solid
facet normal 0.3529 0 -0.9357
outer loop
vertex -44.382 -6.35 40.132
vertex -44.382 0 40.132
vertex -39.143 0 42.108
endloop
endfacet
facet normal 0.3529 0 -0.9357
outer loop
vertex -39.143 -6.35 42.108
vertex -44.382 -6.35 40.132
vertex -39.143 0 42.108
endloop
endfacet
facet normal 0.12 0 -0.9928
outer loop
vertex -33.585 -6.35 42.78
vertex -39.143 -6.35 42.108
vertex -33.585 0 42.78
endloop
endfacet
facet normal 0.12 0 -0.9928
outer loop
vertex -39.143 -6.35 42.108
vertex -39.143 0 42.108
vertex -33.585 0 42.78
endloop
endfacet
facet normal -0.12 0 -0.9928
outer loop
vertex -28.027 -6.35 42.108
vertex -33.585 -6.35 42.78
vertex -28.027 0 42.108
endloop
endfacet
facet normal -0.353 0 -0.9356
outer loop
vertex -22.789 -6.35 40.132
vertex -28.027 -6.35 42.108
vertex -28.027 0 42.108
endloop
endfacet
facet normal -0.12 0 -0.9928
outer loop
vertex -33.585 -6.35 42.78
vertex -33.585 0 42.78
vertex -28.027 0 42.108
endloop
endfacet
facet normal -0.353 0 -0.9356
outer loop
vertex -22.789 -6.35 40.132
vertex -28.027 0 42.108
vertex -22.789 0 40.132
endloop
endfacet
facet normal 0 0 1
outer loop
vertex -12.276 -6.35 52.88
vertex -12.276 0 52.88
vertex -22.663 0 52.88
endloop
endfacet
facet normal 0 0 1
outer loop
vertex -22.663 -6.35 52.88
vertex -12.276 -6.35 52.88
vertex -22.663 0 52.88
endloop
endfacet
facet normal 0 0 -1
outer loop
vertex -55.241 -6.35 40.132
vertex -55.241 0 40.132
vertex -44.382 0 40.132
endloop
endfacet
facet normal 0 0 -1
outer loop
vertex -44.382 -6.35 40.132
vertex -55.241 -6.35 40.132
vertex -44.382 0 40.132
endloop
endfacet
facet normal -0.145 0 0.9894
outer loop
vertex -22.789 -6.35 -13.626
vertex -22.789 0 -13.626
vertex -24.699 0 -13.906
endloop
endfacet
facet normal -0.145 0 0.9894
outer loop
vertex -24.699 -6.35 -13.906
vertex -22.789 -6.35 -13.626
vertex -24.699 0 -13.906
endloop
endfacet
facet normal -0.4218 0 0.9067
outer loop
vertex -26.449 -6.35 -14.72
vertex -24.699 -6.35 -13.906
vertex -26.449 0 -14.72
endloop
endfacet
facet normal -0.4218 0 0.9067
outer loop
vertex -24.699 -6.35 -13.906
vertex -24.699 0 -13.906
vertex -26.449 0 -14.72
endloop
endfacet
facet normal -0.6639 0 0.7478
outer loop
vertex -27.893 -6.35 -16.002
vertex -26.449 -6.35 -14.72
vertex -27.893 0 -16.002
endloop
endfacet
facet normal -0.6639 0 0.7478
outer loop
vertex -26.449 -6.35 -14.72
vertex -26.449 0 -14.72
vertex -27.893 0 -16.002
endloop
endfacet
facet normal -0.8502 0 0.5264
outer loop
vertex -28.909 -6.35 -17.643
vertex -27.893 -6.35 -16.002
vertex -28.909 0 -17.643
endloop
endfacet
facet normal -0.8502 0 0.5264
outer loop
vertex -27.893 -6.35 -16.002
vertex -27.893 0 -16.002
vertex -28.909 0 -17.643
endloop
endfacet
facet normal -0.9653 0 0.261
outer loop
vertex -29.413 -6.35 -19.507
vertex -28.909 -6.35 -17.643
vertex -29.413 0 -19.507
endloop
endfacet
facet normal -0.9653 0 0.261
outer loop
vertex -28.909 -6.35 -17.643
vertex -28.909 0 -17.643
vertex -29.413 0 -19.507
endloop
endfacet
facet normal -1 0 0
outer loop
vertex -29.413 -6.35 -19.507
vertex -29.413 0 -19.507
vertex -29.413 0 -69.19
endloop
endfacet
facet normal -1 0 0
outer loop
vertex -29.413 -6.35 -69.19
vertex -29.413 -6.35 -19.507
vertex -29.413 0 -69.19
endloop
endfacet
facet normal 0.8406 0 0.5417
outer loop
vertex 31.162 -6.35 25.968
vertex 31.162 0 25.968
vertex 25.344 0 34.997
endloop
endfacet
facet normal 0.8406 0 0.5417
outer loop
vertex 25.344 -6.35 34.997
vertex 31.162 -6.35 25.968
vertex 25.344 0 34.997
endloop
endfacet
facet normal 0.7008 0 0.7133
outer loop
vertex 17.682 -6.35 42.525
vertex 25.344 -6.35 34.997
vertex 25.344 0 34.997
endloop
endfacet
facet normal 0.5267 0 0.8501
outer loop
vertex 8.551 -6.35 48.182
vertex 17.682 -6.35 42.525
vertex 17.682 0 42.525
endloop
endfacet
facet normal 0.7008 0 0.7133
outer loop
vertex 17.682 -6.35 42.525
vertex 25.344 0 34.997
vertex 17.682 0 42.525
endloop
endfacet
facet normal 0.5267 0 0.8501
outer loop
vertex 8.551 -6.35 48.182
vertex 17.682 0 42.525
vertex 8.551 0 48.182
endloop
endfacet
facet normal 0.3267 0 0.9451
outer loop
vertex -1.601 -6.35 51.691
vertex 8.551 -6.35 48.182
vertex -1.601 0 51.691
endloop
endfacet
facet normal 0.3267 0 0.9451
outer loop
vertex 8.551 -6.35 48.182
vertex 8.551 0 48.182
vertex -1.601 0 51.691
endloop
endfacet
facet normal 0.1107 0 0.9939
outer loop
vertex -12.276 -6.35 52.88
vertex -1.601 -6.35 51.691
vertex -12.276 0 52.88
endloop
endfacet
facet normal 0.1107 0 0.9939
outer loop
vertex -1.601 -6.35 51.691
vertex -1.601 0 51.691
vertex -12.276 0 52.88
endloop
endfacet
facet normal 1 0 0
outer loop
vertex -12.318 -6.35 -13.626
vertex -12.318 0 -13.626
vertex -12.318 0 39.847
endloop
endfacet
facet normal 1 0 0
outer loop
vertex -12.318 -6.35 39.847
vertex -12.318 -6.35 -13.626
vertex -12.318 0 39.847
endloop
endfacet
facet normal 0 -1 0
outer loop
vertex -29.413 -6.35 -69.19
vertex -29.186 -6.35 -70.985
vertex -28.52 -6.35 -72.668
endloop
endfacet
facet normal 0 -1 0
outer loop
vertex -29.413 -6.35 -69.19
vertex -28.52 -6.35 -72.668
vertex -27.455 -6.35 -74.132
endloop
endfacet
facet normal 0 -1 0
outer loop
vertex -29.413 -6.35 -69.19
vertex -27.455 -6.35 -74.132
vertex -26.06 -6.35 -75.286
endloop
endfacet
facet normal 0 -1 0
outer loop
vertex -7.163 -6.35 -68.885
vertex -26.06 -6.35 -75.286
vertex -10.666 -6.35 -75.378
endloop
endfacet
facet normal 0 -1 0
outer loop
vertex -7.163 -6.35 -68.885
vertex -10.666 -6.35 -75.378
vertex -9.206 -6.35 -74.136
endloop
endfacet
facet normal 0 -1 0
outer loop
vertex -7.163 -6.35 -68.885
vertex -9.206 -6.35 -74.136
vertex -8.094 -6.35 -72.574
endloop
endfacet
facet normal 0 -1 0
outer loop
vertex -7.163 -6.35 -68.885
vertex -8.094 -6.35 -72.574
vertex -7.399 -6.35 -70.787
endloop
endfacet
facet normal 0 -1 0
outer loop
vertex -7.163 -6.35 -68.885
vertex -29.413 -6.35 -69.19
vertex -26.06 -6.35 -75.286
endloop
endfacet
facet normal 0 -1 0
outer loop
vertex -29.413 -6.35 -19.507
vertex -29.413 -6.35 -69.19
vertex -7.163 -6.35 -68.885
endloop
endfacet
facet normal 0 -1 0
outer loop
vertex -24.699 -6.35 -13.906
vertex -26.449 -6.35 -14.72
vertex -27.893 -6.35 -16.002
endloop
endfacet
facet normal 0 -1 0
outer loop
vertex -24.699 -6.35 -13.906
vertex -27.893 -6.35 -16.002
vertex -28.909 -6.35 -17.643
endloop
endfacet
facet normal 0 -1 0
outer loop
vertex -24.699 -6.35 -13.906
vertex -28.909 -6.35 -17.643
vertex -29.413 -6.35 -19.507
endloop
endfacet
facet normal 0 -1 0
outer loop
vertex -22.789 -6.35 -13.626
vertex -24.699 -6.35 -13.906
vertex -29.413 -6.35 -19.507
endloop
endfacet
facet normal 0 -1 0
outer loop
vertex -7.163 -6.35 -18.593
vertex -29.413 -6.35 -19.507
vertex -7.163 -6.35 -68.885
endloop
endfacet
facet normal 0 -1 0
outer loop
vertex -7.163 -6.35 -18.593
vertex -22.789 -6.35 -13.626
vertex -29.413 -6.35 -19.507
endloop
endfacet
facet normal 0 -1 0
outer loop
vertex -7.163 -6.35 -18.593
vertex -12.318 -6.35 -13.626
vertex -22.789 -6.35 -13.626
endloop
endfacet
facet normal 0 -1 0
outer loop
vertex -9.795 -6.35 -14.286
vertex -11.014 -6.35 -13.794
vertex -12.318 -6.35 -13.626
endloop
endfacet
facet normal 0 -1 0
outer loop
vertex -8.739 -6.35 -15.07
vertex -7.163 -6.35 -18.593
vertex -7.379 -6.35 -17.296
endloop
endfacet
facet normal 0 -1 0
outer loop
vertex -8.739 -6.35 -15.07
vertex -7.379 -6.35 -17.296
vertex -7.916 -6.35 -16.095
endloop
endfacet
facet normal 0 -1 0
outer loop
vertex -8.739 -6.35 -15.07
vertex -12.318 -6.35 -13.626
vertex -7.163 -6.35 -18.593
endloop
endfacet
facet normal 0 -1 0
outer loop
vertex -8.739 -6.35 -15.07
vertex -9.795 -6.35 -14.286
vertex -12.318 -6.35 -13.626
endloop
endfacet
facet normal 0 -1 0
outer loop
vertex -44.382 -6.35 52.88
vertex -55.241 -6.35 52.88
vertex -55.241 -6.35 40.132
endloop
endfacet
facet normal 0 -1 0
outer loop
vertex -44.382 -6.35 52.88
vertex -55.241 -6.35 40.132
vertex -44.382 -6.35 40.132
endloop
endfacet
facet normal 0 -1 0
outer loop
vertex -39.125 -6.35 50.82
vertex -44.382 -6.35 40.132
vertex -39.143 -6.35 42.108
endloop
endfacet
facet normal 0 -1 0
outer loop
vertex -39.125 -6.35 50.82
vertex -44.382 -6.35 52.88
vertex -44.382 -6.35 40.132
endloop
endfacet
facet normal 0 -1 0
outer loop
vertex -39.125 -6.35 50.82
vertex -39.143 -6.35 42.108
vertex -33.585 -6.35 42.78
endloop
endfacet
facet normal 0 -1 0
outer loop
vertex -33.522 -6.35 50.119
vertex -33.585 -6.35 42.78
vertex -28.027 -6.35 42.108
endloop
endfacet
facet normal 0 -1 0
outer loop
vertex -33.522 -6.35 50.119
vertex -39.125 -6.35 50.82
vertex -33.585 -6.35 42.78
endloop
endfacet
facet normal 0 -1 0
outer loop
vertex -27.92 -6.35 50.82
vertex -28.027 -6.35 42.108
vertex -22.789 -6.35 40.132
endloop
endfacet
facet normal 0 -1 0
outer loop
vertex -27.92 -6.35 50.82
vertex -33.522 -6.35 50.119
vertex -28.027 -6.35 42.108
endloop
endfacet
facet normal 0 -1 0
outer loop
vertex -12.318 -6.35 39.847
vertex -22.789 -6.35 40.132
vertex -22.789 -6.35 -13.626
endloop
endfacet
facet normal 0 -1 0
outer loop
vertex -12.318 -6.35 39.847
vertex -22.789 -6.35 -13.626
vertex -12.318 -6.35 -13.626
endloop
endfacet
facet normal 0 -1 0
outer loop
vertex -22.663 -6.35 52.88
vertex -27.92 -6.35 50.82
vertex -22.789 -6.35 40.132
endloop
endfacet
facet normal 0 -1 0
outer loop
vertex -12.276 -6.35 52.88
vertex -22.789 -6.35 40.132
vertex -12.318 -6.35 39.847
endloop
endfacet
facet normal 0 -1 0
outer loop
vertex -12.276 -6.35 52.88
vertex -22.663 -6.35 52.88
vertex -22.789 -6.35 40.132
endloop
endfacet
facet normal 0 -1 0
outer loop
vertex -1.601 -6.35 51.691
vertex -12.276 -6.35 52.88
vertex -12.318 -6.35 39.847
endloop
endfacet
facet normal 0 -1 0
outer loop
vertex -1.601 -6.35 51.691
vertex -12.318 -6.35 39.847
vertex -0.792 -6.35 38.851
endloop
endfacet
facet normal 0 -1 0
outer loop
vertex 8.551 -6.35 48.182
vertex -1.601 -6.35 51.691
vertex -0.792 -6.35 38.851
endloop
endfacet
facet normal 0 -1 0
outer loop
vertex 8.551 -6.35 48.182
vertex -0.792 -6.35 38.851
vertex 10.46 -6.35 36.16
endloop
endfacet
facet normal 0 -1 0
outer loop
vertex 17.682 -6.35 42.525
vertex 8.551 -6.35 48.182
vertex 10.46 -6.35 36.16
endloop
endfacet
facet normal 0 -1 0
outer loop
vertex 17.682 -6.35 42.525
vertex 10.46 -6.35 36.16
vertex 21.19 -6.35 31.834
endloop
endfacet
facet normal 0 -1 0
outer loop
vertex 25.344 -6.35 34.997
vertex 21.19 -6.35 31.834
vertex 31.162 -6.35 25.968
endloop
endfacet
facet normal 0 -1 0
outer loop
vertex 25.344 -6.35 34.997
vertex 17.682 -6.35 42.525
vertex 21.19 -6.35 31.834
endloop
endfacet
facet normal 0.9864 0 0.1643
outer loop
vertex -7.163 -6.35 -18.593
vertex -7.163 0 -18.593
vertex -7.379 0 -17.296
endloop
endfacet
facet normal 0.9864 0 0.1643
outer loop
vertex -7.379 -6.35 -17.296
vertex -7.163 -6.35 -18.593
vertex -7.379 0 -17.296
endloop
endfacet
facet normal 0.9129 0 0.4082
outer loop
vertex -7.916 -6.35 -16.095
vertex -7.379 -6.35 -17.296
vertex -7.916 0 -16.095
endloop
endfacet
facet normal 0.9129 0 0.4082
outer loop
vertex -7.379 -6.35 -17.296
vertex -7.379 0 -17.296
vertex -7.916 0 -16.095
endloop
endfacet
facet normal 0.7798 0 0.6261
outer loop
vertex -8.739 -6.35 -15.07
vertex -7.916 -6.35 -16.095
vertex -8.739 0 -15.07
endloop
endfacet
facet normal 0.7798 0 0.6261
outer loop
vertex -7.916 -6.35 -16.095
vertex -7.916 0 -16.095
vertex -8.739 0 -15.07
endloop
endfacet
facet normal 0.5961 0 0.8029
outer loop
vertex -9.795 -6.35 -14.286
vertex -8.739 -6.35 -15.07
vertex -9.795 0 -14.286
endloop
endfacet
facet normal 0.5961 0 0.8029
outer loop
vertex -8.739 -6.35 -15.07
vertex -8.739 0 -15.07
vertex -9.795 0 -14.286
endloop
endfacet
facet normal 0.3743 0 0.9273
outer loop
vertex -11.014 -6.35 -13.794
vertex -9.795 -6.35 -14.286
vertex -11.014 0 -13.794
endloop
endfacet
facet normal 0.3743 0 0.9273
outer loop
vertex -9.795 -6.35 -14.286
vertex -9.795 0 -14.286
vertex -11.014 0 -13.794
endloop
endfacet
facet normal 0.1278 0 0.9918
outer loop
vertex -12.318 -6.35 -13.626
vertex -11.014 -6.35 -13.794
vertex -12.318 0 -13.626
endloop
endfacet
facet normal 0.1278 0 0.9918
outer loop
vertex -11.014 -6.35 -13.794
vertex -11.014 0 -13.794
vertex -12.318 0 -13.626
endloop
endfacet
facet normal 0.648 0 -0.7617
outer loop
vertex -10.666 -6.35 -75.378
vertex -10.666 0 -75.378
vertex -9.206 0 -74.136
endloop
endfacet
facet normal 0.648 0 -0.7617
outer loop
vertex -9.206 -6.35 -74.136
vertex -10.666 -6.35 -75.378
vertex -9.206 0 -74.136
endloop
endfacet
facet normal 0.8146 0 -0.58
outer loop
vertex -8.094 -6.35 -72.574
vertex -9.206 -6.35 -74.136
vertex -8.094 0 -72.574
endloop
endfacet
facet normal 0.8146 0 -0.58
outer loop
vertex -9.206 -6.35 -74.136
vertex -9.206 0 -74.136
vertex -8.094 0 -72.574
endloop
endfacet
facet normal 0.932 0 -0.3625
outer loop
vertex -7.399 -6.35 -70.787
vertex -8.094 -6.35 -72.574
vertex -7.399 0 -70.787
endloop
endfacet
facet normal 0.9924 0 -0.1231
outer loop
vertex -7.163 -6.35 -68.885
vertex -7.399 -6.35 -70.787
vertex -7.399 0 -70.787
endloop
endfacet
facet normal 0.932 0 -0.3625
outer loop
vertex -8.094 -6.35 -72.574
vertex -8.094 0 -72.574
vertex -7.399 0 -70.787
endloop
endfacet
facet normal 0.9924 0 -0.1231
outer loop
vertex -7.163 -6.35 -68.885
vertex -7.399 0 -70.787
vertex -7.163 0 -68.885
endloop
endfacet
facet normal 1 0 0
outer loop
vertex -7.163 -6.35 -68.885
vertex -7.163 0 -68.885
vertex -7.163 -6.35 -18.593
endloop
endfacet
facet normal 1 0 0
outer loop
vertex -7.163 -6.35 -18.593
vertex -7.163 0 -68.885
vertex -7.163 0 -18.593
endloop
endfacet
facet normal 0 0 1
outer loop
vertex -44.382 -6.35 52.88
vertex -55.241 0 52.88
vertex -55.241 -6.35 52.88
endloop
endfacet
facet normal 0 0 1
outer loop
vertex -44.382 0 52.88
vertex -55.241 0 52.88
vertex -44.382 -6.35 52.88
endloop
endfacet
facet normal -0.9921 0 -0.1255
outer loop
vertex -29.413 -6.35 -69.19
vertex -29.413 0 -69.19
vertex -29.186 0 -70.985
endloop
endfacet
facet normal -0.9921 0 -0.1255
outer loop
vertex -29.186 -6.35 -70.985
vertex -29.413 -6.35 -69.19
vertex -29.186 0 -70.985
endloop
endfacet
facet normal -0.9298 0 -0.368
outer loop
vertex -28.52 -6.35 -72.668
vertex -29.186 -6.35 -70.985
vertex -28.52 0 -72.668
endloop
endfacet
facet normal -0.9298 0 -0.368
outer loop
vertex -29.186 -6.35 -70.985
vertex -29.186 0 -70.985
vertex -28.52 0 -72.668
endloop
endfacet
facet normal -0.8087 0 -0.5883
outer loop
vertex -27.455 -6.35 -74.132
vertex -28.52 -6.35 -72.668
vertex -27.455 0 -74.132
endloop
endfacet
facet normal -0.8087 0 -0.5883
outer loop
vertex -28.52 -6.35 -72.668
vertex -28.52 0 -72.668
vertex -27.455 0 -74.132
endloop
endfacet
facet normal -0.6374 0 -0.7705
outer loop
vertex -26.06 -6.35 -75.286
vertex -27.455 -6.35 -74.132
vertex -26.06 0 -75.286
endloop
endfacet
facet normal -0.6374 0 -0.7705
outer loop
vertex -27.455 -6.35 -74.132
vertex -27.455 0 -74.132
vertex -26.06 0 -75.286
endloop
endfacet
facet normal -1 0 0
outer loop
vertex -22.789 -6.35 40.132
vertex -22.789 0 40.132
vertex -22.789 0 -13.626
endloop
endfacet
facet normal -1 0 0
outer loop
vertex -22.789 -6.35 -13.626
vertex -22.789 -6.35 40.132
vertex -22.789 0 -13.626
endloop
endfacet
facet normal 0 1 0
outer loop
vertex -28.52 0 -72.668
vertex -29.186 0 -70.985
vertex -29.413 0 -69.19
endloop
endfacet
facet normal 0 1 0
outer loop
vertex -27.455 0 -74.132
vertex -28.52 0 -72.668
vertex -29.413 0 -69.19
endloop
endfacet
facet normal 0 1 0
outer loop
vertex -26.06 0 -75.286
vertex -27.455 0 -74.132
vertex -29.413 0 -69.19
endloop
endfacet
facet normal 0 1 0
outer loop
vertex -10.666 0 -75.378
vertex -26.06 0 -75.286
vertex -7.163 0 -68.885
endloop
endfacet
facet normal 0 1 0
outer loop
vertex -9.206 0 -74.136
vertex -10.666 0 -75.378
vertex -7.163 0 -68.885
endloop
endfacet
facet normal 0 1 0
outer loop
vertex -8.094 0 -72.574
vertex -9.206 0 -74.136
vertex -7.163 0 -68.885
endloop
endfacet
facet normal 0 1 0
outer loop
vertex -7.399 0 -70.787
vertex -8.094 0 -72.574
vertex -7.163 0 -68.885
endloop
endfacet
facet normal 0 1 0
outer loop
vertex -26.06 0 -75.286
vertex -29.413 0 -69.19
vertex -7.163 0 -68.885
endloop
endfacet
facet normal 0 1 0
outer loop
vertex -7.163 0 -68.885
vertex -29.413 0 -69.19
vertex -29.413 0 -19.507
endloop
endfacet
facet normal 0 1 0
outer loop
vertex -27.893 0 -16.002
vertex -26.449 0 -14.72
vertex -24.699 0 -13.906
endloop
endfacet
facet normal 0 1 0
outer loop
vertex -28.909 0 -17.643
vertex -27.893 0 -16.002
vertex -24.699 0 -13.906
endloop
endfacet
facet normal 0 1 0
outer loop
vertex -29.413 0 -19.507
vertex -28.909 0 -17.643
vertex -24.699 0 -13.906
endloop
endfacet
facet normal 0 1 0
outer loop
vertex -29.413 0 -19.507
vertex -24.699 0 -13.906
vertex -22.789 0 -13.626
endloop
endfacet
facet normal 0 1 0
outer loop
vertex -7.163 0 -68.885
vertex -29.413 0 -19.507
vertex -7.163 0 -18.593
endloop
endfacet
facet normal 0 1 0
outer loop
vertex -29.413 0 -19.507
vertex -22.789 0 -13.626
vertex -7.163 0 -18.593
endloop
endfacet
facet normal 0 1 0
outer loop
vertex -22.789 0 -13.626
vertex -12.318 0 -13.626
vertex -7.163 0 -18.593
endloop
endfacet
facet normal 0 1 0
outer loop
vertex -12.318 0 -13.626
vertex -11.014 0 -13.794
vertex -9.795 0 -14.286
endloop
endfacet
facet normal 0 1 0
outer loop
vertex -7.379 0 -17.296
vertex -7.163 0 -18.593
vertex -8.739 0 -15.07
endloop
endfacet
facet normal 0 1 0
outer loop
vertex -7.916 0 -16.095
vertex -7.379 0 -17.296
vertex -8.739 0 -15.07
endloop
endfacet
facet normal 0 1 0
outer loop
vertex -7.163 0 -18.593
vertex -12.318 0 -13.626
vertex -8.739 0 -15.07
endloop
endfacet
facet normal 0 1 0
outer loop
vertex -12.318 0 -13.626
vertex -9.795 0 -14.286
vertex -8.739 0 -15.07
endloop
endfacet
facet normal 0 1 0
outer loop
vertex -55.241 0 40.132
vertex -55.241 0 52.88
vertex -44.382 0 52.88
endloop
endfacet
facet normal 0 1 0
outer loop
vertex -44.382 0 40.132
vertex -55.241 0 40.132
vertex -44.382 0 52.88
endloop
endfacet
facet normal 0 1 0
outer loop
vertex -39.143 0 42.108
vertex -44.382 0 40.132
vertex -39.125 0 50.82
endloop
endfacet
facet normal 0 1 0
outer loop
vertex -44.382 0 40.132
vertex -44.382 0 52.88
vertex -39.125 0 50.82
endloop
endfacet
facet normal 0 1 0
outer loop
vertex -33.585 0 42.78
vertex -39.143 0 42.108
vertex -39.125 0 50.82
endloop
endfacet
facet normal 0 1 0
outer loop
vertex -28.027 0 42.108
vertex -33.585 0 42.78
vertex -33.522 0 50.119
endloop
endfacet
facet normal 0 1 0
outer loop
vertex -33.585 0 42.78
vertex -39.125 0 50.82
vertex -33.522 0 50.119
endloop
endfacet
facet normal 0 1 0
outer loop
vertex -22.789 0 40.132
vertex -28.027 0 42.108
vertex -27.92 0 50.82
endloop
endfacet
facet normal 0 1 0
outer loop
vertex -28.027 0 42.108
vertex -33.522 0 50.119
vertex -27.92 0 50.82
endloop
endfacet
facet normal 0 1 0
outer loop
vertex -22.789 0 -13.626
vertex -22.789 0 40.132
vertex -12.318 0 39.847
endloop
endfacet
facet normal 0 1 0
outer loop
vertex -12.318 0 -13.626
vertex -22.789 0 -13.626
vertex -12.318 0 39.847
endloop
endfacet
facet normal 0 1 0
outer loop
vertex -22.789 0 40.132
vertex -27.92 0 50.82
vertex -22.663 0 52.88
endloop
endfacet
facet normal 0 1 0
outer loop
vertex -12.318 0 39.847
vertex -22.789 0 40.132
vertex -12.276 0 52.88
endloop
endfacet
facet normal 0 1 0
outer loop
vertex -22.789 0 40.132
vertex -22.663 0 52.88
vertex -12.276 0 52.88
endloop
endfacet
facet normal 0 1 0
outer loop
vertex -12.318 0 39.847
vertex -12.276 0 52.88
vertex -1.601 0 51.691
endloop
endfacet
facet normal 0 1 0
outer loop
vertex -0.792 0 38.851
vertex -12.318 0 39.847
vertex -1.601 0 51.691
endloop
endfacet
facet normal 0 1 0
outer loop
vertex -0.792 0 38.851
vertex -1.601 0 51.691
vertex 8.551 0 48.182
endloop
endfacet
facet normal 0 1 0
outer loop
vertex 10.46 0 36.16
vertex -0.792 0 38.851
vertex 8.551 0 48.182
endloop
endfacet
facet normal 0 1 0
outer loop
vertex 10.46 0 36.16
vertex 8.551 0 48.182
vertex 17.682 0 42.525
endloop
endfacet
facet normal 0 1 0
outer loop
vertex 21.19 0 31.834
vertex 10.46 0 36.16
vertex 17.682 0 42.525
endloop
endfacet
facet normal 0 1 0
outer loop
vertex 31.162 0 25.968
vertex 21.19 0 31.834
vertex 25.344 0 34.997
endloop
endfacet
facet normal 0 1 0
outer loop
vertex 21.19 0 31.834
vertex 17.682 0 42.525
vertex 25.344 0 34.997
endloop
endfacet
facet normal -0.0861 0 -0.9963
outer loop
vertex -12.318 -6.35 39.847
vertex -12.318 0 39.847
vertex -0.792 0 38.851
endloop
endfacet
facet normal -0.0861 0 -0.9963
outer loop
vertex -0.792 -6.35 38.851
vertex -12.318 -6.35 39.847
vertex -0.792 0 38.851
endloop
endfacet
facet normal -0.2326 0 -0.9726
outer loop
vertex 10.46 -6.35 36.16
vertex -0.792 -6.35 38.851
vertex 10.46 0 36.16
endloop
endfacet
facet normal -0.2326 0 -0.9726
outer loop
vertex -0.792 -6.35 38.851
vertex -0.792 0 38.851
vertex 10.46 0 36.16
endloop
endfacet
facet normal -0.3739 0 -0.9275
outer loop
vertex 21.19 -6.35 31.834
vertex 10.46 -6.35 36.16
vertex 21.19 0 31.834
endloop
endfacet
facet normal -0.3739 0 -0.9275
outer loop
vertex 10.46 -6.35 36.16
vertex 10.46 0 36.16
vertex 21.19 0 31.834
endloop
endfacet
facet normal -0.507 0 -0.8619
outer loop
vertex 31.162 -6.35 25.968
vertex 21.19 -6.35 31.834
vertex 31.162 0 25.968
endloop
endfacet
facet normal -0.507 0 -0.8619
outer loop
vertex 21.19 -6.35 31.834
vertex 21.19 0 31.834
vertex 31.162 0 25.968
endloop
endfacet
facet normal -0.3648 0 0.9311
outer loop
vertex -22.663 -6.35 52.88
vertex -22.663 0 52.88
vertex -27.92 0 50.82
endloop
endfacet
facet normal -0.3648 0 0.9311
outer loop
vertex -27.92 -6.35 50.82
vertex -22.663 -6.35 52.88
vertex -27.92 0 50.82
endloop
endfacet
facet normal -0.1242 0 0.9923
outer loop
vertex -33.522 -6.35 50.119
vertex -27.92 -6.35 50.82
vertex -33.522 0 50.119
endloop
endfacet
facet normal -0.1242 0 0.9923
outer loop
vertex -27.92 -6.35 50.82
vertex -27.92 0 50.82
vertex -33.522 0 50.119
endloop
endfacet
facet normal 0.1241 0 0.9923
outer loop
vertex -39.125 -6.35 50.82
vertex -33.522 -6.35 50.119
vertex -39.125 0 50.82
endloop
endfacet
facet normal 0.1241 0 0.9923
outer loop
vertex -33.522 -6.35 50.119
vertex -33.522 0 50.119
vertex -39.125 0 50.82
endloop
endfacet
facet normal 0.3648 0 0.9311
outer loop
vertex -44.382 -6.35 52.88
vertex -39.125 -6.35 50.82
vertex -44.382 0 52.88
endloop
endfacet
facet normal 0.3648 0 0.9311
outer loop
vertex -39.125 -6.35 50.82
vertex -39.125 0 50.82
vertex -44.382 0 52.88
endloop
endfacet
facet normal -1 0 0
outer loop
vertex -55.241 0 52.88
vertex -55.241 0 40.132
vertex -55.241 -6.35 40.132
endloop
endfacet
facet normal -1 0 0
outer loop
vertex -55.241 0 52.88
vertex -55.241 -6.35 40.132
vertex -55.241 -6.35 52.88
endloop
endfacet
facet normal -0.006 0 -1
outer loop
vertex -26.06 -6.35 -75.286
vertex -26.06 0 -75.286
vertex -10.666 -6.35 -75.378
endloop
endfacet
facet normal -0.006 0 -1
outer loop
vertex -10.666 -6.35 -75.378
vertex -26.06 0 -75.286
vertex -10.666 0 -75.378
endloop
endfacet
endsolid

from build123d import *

# Parameters (mm, degrees)
F0_W     = 10.859374
F0_H     = 12.747962
F1_DEPTH = 6.35


with BuildPart() as f1:
    # F0 (on Front) → F1 (new body)
    with BuildSketch(Plane.XZ):
        with Locations((-49.811488, 46.506466)):
            Rectangle(F0_W, F0_H)
        with BuildLine():
            ThreePointArc((-22.663044, 52.880447), (-33.522422, 50.119041), (-44.381801, 52.880447))
            Line((-44.381801, 52.880447), (-44.381801, 40.132485))
            ThreePointArc((-44.381801, 40.132485), (-33.58522, 42.779586), (-22.788638, 40.132485))
            Line((-22.788638, 40.132485), (-22.663044, 52.880447))
        make_face()
        Polygon((-12.275815, 52.880447), (-22.663044, 52.880447), (-22.788638, 40.132485), (-12.31831, 39.847307), align=None)
        Polygon((-12.31831, 39.847307), (-22.788638, 40.132485), (-22.788638, -13.626155), (-12.31831, -13.626155), align=None)
        with BuildLine():
            ThreePointArc((31.161692, 25.968079), (13.273611, 45.607102), (-12.275815, 52.880447))
            Line((-12.275815, 52.880447), (-12.31831, 39.847307))
            ThreePointArc((-12.31831, 39.847307), (10.459966, 36.160339), (31.161692, 25.968079))
        make_face()
        with BuildLine():
            Line((-12.31831, -13.626155), (-22.788638, -13.626155))
            ThreePointArc((-22.788638, -13.626155), (-27.217846, -15.308543), (-29.413201, -19.5072))
            Line((-29.413201, -19.5072), (-29.413201, -69.189601))
            ThreePointArc((-29.413201, -69.189601), (-28.519701, -72.668194), (-26.060402, -75.285599))
            Line((-26.060402, -75.285599), (-10.666025, -75.377978))
            ThreePointArc((-10.666025, -75.377978), (-8.094471, -72.573766), (-7.162803, -68.884797))
            Line((-7.162803, -68.884797), (-7.162803, -18.592801))
            ThreePointArc((-7.162803, -18.592801), (-8.738966, -15.069801), (-12.31831, -13.626155))
        make_face()
    extrude(amount=F1_DEPTH)


solid = f1.part
